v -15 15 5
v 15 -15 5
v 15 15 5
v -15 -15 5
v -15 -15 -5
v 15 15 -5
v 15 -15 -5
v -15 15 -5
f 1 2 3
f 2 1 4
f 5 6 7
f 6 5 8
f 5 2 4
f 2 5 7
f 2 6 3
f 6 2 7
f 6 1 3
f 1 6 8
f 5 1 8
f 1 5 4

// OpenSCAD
// SPDX-License-Identifier: CC-BY-NC-SA-4.0
// body part for __NAME__.
module body() {
    cube([30, 30, 10], center = true);
}

// Render this part alone when opened directly.
body();
